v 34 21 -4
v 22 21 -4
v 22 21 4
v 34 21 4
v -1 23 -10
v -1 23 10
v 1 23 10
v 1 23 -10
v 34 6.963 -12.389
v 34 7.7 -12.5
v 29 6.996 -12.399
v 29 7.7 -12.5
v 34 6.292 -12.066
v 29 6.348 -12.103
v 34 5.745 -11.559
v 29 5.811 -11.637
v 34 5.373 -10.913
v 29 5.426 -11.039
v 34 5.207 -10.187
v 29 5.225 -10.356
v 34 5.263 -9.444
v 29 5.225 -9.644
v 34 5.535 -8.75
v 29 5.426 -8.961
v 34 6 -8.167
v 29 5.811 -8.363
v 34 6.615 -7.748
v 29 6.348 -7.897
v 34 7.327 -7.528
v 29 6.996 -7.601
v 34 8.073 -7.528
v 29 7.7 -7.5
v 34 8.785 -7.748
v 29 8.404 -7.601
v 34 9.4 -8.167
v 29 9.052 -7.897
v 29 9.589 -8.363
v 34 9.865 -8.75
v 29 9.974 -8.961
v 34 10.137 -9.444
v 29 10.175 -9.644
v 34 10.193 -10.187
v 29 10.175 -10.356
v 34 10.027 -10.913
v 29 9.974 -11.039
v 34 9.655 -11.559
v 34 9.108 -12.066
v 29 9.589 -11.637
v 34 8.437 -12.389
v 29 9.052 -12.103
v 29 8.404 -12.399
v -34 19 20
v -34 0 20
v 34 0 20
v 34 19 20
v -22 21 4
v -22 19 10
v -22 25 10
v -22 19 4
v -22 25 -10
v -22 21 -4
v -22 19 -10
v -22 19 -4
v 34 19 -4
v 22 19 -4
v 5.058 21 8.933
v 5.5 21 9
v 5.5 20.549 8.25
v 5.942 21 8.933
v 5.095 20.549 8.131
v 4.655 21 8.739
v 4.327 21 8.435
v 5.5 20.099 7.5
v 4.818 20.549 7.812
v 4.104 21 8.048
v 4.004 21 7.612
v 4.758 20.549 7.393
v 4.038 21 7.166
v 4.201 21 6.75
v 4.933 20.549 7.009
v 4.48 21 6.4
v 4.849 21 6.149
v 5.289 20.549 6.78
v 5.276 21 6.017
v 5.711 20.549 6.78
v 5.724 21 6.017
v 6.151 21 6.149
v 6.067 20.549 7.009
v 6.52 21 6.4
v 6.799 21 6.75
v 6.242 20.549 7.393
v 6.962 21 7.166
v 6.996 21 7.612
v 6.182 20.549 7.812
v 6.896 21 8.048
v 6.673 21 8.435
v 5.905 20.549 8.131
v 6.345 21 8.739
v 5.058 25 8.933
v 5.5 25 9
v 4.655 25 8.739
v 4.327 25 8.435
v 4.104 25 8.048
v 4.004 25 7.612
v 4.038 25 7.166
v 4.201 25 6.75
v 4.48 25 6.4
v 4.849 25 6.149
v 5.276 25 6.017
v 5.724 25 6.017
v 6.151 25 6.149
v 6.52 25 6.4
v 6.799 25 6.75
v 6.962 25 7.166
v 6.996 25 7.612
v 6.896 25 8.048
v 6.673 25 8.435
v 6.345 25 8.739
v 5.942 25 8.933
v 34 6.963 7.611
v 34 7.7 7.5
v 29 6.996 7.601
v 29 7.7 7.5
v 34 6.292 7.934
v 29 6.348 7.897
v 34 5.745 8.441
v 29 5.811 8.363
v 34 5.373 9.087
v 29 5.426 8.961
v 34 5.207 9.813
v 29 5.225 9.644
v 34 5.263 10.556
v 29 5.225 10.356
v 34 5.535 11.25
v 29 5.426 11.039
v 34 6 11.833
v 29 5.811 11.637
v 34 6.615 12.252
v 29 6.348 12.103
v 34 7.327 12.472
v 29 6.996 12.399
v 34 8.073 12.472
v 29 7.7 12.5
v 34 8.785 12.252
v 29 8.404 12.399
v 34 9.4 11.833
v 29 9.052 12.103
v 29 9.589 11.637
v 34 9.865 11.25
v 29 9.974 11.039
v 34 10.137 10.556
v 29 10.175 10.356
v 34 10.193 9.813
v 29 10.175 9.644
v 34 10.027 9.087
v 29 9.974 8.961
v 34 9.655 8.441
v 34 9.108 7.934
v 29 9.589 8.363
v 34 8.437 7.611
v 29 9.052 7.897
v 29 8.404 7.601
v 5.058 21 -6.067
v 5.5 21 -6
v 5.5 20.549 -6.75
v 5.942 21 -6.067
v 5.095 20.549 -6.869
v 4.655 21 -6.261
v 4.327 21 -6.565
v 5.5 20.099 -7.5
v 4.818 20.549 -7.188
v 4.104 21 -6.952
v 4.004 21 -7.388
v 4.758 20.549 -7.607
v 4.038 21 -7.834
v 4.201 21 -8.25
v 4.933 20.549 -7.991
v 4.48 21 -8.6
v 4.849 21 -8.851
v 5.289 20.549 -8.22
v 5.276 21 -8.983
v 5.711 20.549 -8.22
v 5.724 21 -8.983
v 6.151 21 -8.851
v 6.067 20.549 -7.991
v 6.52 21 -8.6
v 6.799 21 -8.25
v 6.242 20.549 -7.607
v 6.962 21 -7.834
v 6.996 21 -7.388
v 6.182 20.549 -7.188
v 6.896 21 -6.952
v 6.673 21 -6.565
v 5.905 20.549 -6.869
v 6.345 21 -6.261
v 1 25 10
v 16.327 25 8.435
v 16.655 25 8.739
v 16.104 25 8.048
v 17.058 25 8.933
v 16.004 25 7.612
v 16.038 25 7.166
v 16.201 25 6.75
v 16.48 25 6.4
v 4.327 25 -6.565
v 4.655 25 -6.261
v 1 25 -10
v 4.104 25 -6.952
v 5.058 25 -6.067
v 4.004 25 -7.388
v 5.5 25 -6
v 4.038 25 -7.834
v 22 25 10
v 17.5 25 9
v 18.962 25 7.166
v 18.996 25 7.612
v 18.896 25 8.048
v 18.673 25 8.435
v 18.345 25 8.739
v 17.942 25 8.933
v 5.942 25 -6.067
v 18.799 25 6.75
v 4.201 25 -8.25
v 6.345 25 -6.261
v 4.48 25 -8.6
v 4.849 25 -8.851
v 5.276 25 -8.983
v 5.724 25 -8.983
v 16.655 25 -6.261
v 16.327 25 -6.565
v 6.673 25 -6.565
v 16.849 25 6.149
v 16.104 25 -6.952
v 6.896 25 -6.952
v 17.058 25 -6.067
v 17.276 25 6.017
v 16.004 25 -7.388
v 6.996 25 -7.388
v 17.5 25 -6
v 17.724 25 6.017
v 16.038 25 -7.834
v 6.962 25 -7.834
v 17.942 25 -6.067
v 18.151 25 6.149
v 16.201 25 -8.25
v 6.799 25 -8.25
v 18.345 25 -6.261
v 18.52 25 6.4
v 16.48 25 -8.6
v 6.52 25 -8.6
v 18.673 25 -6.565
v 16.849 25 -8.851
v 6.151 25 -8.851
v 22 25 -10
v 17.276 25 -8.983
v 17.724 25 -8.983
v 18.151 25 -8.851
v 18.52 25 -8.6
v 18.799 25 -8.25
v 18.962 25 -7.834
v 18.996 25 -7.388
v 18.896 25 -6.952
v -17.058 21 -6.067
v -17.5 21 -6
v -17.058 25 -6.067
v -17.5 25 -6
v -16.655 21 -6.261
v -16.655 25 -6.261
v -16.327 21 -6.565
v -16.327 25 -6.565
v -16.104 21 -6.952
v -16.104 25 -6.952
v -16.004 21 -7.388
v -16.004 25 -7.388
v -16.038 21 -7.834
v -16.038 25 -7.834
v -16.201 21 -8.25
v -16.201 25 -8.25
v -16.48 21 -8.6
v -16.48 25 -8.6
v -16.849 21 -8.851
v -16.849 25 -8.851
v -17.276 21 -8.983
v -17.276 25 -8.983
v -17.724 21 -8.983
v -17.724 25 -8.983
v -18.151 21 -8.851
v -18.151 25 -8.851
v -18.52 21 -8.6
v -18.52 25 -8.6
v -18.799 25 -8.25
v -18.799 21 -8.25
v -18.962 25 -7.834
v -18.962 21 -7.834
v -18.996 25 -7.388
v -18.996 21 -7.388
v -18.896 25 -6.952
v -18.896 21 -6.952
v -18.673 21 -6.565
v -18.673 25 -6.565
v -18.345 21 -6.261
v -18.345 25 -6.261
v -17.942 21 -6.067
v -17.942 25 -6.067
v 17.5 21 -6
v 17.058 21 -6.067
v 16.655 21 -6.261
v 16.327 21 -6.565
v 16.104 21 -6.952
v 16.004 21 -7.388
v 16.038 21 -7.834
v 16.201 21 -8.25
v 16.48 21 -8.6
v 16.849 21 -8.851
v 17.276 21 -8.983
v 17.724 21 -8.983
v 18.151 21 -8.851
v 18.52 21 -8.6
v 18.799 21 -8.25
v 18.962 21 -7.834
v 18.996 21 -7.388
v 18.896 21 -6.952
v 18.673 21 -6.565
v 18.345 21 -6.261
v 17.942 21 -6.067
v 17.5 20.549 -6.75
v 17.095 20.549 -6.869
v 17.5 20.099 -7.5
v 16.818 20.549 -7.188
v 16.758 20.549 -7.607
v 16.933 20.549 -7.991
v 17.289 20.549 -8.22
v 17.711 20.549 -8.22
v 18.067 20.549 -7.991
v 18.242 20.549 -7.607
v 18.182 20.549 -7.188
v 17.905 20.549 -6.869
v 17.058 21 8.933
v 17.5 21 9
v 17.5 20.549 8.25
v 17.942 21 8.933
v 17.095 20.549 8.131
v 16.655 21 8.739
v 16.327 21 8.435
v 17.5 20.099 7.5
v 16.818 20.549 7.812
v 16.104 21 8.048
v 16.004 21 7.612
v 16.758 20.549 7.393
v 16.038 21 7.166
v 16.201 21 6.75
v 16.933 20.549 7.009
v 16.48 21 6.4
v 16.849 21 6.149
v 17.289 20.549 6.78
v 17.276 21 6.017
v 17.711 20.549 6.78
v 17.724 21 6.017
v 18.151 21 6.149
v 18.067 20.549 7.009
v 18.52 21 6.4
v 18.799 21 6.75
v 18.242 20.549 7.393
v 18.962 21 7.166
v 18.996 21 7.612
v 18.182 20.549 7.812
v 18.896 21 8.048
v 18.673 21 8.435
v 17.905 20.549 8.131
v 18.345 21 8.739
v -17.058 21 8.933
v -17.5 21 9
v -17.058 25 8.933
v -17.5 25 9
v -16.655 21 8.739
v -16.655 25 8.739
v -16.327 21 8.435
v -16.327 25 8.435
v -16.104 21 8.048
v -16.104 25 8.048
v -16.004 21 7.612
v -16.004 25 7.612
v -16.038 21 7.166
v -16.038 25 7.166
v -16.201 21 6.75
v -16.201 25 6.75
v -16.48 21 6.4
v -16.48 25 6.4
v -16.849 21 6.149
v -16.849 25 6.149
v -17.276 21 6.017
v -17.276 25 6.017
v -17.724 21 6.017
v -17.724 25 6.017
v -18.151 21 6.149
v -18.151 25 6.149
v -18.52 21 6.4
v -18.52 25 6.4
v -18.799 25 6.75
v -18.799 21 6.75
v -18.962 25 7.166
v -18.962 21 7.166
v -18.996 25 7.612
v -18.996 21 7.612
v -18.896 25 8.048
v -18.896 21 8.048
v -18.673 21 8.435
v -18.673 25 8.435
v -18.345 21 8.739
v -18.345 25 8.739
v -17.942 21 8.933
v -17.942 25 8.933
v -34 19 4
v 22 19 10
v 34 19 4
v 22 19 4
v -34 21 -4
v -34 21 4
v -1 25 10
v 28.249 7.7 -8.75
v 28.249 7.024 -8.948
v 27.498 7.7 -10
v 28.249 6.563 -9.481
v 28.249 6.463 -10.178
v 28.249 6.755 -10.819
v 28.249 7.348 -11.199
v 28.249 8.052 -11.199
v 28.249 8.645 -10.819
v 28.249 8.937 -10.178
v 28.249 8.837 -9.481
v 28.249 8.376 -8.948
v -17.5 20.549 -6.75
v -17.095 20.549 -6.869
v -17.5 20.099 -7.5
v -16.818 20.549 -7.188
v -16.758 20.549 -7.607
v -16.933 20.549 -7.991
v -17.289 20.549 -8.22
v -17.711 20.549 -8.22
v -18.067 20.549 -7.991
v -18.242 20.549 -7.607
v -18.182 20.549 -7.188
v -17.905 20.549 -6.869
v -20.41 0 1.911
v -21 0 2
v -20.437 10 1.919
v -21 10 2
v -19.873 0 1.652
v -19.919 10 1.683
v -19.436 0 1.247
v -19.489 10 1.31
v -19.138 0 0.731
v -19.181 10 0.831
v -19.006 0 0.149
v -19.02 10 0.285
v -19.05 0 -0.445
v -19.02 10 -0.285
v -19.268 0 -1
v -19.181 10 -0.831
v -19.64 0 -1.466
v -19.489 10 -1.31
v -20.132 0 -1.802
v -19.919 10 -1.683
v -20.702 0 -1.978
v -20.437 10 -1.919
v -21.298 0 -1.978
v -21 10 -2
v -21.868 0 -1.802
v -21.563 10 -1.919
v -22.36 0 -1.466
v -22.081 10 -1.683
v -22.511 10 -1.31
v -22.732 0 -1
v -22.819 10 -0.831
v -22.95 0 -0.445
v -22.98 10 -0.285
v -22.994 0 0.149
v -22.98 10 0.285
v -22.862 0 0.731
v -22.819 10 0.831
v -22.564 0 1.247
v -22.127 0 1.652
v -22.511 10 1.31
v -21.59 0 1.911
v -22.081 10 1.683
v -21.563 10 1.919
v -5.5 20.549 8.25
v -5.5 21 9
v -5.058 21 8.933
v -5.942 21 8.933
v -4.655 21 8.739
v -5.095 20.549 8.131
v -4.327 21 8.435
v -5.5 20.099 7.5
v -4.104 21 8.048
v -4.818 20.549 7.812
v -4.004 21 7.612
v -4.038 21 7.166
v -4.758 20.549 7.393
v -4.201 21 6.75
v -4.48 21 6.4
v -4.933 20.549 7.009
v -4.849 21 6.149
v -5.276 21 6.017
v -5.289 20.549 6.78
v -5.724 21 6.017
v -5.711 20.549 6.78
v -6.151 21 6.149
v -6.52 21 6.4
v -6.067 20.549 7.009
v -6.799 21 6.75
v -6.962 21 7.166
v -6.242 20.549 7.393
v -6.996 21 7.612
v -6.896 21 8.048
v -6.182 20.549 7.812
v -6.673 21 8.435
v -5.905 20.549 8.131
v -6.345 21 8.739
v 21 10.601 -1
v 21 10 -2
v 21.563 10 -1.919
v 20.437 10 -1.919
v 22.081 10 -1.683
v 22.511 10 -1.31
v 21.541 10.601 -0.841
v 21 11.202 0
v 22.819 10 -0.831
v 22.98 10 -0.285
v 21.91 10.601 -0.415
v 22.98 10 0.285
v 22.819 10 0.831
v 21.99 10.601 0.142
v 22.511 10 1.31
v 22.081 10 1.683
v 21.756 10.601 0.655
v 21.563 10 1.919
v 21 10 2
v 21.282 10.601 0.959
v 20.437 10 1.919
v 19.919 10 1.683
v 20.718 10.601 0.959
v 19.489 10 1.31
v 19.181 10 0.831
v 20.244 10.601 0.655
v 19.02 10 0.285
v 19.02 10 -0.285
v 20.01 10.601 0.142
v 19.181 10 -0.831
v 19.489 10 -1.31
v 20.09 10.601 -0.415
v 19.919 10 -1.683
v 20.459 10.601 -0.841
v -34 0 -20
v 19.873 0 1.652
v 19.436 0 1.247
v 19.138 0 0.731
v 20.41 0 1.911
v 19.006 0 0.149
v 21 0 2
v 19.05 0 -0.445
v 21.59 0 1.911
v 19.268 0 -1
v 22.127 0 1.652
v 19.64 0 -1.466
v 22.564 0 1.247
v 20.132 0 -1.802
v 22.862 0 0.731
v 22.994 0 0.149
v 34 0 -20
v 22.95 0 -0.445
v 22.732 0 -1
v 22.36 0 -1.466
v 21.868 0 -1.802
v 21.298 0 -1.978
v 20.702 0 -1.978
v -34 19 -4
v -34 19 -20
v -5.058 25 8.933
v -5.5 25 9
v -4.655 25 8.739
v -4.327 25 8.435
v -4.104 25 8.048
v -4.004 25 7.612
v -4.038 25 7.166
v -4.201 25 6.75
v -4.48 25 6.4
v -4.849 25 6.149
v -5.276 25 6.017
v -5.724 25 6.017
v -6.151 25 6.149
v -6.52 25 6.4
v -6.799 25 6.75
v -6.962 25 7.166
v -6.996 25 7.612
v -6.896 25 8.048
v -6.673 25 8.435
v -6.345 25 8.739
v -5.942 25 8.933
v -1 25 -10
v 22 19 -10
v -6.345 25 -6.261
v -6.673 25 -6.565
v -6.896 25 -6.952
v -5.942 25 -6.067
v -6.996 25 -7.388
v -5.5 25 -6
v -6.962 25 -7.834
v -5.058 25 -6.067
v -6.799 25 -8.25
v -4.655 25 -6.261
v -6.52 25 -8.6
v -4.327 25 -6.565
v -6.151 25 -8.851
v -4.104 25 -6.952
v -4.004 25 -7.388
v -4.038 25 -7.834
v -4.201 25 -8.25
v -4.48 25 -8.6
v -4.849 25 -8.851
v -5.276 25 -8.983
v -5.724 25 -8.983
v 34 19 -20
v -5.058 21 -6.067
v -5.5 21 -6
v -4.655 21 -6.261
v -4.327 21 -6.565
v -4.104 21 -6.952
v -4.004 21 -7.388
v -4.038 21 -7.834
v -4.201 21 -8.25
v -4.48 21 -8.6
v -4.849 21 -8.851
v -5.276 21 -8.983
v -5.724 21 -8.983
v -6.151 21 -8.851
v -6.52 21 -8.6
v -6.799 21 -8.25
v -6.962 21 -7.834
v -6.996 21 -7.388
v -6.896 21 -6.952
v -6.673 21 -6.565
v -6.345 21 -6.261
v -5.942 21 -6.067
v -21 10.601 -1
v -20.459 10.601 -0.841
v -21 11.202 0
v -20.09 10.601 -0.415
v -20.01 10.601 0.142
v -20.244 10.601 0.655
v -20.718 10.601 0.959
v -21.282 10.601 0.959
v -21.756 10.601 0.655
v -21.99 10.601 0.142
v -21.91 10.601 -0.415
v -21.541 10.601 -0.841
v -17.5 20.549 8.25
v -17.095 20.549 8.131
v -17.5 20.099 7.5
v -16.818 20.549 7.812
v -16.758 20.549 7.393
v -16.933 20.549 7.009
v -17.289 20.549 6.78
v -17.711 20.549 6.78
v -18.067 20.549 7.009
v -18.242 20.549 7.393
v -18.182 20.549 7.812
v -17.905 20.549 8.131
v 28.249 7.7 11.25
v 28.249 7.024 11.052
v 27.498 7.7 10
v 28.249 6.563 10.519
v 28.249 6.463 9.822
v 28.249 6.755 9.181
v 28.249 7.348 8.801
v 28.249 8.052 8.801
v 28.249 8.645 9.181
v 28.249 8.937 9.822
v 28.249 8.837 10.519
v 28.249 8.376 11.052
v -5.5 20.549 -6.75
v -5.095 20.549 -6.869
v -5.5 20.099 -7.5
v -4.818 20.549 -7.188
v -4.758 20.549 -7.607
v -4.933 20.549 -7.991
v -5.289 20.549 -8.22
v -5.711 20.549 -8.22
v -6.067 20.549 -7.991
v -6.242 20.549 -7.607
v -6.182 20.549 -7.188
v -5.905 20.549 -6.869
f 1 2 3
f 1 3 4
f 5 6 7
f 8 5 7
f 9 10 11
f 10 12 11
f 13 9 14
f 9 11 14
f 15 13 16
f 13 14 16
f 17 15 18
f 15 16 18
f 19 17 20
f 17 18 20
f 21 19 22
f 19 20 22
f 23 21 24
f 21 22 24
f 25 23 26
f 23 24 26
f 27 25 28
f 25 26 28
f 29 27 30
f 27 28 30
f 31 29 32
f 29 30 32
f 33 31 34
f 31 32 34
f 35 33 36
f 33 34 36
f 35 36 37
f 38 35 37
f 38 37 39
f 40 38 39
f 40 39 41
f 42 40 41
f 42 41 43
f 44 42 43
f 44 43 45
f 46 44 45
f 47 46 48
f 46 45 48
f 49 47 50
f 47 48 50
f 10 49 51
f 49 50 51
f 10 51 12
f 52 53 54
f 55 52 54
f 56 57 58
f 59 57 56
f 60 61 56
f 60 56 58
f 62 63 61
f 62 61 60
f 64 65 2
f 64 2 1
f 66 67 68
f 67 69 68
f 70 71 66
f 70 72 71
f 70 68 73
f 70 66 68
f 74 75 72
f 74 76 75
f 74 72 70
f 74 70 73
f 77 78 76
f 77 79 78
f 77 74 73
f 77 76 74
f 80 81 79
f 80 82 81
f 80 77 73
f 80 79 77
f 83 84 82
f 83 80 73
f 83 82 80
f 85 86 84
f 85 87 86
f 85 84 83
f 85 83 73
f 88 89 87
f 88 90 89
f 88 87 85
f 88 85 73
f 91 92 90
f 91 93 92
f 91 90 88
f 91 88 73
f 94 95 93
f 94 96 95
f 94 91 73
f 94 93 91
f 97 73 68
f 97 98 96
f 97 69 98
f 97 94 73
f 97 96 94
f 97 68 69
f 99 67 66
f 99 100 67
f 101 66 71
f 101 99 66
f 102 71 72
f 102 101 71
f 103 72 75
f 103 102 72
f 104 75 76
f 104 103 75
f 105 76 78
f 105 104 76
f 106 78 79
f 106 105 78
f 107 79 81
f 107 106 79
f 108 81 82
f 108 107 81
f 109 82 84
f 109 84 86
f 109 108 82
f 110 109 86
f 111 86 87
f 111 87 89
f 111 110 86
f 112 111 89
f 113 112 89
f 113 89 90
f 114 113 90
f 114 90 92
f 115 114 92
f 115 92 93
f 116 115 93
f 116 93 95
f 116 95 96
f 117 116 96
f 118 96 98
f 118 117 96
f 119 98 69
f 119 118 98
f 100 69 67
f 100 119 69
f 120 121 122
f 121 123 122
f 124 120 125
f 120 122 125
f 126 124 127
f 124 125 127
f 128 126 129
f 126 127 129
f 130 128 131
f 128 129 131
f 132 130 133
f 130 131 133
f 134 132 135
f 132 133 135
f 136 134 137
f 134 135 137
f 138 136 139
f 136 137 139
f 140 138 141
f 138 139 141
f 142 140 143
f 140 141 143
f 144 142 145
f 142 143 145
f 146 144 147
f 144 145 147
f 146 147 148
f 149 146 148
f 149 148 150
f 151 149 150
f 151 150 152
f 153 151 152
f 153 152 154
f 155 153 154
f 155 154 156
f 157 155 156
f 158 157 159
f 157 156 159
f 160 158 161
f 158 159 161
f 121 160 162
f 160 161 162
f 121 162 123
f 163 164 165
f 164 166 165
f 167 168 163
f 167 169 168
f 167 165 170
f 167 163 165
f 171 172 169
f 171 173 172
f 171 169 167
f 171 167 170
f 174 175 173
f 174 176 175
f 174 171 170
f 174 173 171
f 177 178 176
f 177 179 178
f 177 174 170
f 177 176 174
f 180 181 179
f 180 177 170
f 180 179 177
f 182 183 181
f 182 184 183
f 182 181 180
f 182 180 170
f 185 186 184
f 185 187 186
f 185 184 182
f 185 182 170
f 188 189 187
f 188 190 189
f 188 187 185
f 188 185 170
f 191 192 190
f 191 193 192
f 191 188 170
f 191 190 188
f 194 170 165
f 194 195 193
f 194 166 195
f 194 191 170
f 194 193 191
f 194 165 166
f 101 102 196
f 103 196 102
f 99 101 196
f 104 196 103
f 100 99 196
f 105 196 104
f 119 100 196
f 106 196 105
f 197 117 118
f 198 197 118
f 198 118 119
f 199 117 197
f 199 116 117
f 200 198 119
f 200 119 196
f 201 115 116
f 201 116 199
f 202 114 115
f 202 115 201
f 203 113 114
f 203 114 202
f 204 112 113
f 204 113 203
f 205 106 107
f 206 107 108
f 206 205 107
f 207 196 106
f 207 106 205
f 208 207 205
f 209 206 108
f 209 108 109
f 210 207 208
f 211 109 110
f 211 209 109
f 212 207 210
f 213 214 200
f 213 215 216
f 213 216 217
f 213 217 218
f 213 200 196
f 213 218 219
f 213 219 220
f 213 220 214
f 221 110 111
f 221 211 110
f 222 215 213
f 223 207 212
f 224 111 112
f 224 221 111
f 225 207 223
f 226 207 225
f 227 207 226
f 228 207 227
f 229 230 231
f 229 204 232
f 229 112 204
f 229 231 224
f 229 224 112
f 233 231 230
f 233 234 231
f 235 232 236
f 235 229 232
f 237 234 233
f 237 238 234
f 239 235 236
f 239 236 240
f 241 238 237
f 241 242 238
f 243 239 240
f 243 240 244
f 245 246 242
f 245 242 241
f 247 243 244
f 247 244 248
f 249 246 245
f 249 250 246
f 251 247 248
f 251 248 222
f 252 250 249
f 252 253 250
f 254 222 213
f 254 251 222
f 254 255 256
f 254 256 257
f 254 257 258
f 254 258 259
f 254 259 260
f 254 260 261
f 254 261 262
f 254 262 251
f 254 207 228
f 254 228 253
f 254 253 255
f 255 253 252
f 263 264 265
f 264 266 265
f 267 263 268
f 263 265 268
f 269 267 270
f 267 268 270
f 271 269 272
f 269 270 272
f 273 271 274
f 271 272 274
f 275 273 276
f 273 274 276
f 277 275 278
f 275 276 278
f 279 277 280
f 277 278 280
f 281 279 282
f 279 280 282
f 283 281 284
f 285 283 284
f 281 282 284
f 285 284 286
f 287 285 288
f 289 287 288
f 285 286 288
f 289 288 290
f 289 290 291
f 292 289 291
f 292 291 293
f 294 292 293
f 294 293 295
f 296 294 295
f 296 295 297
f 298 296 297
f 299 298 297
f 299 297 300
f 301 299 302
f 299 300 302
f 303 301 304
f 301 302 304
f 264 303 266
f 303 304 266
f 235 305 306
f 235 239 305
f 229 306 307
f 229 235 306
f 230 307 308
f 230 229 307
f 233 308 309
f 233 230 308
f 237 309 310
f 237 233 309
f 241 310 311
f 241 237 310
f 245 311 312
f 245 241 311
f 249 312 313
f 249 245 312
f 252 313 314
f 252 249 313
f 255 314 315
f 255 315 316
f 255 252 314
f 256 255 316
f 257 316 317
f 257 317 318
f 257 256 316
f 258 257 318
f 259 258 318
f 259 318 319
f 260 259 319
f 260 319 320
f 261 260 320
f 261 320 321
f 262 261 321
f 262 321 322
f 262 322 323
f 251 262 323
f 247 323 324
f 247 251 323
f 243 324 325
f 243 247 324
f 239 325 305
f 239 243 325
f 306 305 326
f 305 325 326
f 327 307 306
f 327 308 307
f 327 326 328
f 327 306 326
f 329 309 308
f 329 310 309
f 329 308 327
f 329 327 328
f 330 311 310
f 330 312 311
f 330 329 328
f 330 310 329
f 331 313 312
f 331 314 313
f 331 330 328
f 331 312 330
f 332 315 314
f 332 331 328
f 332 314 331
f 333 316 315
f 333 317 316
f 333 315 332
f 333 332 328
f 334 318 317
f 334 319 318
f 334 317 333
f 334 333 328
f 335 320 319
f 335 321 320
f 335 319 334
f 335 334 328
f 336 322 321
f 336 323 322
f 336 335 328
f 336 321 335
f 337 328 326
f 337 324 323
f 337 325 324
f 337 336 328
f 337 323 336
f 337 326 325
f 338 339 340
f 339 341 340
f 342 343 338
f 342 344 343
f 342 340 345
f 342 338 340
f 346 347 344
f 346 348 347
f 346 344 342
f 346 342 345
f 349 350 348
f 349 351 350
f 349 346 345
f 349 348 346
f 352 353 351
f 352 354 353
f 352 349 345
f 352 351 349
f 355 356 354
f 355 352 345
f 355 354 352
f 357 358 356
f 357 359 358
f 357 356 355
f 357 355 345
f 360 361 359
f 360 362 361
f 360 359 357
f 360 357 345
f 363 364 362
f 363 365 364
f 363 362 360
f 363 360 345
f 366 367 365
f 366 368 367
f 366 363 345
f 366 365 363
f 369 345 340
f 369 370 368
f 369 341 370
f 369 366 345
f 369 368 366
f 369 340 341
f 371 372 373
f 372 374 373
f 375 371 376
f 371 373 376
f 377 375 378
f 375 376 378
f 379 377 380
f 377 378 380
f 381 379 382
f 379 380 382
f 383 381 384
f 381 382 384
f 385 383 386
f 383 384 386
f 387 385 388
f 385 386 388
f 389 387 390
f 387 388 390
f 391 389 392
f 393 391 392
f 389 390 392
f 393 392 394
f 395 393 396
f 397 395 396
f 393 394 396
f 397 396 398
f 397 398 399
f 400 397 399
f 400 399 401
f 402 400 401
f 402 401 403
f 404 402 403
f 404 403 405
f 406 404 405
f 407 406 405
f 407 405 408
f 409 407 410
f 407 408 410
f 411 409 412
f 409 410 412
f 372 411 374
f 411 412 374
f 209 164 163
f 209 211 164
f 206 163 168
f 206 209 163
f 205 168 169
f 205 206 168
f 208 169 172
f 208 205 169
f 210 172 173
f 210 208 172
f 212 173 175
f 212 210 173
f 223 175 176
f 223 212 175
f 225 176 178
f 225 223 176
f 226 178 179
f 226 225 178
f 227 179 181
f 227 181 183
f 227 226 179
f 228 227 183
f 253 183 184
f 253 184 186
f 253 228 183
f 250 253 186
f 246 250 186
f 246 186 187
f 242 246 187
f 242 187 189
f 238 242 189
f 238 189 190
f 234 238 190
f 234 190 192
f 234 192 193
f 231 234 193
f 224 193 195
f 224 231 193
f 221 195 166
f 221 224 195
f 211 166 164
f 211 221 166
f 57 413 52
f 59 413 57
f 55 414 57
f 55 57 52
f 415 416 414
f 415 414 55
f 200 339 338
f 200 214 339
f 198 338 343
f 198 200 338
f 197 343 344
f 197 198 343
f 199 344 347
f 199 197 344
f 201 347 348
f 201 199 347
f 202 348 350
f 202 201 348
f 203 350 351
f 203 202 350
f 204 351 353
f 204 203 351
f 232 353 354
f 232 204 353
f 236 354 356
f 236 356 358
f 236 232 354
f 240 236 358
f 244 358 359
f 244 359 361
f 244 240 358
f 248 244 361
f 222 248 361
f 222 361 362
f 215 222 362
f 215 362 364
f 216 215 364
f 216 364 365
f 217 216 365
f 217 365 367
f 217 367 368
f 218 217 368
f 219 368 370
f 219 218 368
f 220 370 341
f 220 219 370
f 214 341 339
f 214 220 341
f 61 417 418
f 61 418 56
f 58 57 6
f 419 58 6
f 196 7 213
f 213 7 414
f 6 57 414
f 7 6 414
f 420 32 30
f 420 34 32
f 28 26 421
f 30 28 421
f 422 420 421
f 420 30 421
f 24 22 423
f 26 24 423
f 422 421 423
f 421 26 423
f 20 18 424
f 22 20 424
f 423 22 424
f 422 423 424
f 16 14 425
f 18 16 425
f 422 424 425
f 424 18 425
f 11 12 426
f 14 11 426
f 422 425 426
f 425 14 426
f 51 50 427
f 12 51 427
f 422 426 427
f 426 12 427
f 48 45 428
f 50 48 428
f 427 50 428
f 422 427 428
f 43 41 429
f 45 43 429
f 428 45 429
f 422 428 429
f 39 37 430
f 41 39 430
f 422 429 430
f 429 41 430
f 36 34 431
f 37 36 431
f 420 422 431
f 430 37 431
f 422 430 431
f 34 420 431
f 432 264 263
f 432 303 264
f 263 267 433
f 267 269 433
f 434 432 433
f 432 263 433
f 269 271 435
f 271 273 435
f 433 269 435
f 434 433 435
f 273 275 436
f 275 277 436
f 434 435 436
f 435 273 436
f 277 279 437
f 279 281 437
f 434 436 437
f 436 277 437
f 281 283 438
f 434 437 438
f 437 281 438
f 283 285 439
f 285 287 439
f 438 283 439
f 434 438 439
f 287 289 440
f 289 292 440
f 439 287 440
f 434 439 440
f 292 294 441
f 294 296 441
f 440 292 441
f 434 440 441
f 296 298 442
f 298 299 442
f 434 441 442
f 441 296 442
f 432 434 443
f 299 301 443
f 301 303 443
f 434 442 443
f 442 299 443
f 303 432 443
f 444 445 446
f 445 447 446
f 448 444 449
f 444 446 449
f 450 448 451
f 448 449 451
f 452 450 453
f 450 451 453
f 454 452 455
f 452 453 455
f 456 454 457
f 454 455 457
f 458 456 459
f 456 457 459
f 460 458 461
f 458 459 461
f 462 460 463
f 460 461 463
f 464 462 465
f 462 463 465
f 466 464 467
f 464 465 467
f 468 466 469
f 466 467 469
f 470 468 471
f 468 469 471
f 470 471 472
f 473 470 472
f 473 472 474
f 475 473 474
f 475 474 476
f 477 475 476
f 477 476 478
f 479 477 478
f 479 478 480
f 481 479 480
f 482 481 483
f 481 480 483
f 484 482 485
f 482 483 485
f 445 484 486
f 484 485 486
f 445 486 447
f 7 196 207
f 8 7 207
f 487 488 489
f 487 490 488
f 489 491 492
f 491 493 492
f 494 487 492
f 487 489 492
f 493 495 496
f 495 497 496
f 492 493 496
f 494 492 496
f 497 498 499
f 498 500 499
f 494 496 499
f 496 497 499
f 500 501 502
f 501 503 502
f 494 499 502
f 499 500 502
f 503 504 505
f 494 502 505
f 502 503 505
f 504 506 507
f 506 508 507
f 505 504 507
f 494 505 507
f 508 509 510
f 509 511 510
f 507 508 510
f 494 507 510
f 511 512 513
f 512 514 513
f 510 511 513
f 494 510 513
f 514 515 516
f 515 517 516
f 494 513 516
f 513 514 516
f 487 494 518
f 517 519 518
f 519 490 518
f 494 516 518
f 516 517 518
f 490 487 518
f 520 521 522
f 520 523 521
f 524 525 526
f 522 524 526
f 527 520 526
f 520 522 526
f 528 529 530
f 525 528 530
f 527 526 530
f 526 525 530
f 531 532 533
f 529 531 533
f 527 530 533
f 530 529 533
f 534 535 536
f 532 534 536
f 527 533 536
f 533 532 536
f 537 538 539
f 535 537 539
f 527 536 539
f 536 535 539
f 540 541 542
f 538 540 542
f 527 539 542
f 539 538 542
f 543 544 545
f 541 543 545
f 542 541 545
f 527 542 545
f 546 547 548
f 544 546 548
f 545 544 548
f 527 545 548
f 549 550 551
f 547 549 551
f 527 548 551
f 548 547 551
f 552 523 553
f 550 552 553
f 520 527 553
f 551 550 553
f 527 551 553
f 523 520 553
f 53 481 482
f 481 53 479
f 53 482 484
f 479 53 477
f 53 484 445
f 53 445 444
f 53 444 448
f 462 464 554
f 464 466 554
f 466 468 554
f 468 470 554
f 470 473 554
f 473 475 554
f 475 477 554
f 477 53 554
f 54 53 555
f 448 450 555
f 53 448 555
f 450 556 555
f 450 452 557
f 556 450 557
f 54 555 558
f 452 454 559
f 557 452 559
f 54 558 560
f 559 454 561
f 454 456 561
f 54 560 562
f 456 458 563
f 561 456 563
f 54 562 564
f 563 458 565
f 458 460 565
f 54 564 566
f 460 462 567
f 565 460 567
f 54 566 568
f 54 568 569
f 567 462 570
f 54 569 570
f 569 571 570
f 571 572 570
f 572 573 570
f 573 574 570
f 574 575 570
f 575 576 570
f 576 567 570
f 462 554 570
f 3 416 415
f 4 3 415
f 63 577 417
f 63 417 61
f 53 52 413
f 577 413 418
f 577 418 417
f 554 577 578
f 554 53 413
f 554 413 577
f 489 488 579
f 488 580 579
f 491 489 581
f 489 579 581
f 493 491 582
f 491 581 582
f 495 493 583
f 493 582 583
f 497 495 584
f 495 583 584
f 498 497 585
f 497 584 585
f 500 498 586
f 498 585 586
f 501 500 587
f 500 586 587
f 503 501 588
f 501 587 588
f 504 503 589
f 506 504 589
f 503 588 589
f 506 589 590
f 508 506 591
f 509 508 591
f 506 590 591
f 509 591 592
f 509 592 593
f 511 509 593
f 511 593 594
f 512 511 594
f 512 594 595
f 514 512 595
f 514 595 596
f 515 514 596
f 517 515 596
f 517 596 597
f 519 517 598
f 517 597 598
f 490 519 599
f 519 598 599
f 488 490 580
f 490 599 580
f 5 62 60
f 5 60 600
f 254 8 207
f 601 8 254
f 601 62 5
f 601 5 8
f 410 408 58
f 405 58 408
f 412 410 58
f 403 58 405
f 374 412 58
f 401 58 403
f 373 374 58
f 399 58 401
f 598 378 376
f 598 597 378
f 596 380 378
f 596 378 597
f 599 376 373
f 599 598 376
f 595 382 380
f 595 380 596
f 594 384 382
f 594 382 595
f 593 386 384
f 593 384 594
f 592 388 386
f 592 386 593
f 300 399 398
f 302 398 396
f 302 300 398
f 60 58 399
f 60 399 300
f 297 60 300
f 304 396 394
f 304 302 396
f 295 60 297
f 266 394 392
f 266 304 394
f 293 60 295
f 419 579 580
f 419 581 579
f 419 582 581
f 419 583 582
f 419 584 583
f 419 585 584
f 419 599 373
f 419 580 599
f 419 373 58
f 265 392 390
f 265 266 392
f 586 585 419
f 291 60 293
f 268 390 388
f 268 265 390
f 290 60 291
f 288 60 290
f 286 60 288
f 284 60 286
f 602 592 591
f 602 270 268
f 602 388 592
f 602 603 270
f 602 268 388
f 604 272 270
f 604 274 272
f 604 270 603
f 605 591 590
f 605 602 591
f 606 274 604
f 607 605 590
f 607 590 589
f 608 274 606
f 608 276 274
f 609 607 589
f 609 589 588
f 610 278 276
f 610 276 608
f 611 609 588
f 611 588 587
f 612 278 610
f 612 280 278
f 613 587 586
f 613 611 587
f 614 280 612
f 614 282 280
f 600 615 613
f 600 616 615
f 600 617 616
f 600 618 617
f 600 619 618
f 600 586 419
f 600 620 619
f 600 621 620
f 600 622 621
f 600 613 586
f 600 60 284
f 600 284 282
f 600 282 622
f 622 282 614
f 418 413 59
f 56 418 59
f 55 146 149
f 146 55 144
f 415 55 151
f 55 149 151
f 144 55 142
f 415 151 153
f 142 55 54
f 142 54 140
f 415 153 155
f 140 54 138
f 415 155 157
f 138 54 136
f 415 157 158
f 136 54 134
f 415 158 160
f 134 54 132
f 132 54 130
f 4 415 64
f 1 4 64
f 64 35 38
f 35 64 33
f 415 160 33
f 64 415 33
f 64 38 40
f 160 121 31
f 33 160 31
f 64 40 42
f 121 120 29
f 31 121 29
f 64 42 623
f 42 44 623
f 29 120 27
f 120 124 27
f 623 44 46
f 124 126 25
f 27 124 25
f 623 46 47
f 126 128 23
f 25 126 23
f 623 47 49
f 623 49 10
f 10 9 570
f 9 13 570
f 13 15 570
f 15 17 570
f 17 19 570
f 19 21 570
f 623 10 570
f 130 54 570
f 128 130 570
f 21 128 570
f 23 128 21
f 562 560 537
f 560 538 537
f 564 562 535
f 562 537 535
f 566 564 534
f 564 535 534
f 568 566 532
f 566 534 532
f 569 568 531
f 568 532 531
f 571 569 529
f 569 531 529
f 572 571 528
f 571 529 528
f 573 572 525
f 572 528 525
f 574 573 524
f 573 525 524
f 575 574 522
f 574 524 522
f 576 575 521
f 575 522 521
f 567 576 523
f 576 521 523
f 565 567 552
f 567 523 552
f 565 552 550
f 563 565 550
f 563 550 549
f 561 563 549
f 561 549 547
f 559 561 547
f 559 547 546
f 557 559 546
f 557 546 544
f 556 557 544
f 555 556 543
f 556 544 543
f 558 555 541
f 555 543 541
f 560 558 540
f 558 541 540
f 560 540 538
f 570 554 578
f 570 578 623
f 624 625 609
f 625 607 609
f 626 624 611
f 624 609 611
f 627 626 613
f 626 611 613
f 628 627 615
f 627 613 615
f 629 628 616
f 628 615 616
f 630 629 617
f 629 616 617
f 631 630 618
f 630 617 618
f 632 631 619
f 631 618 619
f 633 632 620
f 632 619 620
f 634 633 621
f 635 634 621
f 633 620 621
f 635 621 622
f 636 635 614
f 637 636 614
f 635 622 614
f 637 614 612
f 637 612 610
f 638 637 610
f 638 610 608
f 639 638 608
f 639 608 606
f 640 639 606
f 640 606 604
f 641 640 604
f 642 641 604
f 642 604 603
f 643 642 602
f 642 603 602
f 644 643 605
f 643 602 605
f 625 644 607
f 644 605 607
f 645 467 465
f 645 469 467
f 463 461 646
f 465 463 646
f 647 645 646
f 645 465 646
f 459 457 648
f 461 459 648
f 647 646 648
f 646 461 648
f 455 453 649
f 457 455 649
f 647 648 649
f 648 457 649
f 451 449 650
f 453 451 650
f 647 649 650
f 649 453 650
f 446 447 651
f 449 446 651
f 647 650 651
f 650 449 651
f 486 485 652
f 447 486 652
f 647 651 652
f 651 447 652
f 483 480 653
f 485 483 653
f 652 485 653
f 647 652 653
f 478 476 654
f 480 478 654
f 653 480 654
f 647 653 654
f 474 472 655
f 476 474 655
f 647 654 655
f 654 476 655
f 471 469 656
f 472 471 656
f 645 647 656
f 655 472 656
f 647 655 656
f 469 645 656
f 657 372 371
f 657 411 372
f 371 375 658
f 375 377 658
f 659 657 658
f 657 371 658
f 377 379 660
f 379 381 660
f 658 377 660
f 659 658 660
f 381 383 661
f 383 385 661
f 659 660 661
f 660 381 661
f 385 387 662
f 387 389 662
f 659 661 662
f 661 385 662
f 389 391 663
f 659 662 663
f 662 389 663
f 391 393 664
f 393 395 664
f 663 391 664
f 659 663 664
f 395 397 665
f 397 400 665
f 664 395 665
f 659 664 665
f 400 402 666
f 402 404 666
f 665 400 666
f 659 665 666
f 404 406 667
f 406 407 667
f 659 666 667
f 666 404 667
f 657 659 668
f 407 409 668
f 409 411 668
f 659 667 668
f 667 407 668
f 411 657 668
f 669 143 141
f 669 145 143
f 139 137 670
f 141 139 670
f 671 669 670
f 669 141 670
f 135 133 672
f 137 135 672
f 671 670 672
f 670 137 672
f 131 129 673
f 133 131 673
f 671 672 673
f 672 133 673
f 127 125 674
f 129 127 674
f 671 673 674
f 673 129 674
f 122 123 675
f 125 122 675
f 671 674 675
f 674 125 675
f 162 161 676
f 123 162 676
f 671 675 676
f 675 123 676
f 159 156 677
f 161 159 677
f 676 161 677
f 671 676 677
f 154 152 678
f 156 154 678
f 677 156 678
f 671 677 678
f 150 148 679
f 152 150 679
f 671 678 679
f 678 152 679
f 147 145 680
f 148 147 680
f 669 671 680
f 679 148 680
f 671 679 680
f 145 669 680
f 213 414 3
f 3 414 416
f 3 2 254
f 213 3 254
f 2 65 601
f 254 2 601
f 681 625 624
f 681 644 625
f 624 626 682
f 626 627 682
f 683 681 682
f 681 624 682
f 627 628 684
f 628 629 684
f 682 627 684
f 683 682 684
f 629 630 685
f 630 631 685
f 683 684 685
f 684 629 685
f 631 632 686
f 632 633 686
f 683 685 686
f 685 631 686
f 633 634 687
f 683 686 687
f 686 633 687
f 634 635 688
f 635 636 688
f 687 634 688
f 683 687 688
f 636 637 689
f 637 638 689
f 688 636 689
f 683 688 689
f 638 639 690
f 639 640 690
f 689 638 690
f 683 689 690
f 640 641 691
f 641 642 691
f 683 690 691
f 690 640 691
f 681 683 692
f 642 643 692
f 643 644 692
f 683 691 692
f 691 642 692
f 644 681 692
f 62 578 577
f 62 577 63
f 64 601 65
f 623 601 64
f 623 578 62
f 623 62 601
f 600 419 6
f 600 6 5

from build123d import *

# Parameters (mm, degrees)
SKETCH_1_W          = 68
SKETCH_1_H          = 40
EXTRUDE_1_DEPTH     = 19
SKETCH_2_W          = 44
SKETCH_2_H          = 20
EXTRUDE_2_DEPTH     = 6
SKETCH_4_W          = 2
SKETCH_4_H          = 20
CUT_EXTRUDE_1_DEPTH = 2
SKETCH_5_W          = 68
SKETCH_5_H          = 8
EXTRUDE_3_DEPTH     = 2
MM_1_AT_2_COUNT     = 2
MM_1_AT_2_PITCH     = 15
MM_1_AT_3_COUNT     = 2
MM_1_AT_3_PITCH     = 19.209372712
MM_1_AT_4_COUNT     = 2
MM_1_AT_4_PITCH     = 12
MM_2_D              = 4
MM_2_DEPTH          = 10
MM_2_TIP            = 1.201721238
MM_3_D              = 5
MM_3_DEPTH          = 5
MM_3_TIP            = 1.502151548


with BuildPart() as part:
    # 草图1 → 凸台-拉伸1 (new body)
    with BuildSketch(Plane(origin=(0, 0, 0), x_dir=(1, 0, 0), z_dir=(0, 1, 0))):
        Rectangle(SKETCH_1_W, SKETCH_1_H)
    extrude(amount=EXTRUDE_1_DEPTH)

    # 草图2 → 凸台-拉伸2 (add)
    with BuildSketch(Plane(origin=(0, 19, 0), x_dir=(1, 0, 0), z_dir=(0, 1, 0))):
        Rectangle(SKETCH_2_W, SKETCH_2_H)
    extrude(amount=EXTRUDE_2_DEPTH)

    # 草图4 → 切除-拉伸1 (cut)
    with BuildSketch(Plane(origin=(0, 25, 0), x_dir=(1, 0, 0), z_dir=(0, 1, 0))):
        Rectangle(SKETCH_4_W, SKETCH_4_H)
    extrude(amount=-CUT_EXTRUDE_1_DEPTH, mode=Mode.SUBTRACT)

    # 草图5 → 凸台-拉伸3 (add)
    with BuildSketch(Plane(origin=(0, 19, 0), x_dir=(1, 0, 0), z_dir=(0, 1, 0))):
        Rectangle(SKETCH_5_W, SKETCH_5_H)
    extrude(amount=EXTRUDE_3_DEPTH)

    # 草图7 → 大小mm 暗销孔1 (revolve, cut)
    with BuildSketch(Plane(origin=(17.5, 25, -7.5), x_dir=(0, 0, 1), z_dir=(1, 0, 0))):
        Polygon((0, 0), (0, 4.901290929), (1.5, 4), (1.5, 0), align=None)
    mm_1 = revolve(axis=Axis((17.5, 31.35, -7.5), (0, -1, 0)), mode=Mode.SUBTRACT)

    # 大小mm 暗销孔1 at 2: 大小mm 暗销孔1 ×2
    with Locations(*[(0, 0, i * MM_1_AT_2_PITCH) for i in range(1, MM_1_AT_2_COUNT)]):
        add(mm_1, mode=Mode.SUBTRACT)

    # 大小mm 暗销孔1 at 3: 大小mm 暗销孔1 ×2
    with Locations(*[Vector(-0.6246950475544242, 0, 0.7808688094430305) * (i * MM_1_AT_3_PITCH) for i in range(1, MM_1_AT_3_COUNT)]):
        add(mm_1, mode=Mode.SUBTRACT)

    # 大小mm 暗销孔1 at 4: 大小mm 暗销孔1 ×2
    with Locations(*[(-i * MM_1_AT_4_PITCH, 0, 0) for i in range(1, MM_1_AT_4_COUNT)]):
        add(mm_1, mode=Mode.SUBTRACT)

    # 镜向1: 大小mm 暗销孔1 across plane
    add(mm_1.mirror(Plane(origin=(0, 0, 0), x_dir=(0, 0, 1), z_dir=(1, 0, 0))), mode=Mode.SUBTRACT)

    # 镜向1 copy 1 sketch → 镜向1 copy 1 (revolve, cut)
    with BuildSketch(Plane(origin=(-17.5, 25, 7.5), x_dir=(0, 0, 1), z_dir=(-1, 0, 0))):
        Polygon((0, 0), (0, -4.901290929), (1.5, -4), (1.5, 0), align=None)
    revolve(axis=Axis((-17.5, 31.35, 7.5), (0, 1, 0)), mode=Mode.SUBTRACT)

    # 镜向1 copy 2 sketch → 镜向1 copy 2 (revolve, cut)
    with BuildSketch(Plane(origin=(-5.5, 25, 7.5), x_dir=(0, 0, 1), z_dir=(-1, 0, 0))):
        Polygon((0, 0), (0, -4.901290929), (1.5, -4), (1.5, 0), align=None)
    revolve(axis=Axis((-5.5, 31.35, 7.5), (0, 1, 0)), mode=Mode.SUBTRACT)

    # 镜向1 copy 3 sketch → 镜向1 copy 3 (revolve, cut)
    with BuildSketch(Plane(origin=(-5.5, 25, -7.5), x_dir=(0, 0, 1), z_dir=(-1, 0, 0))):
        Polygon((0, 0), (0, -4.901290929), (1.5, -4), (1.5, 0), align=None)
    revolve(axis=Axis((-5.5, 31.35, -7.5), (0, 1, 0)), mode=Mode.SUBTRACT)

    # 大小mm 暗销孔2
    with Locations(Plane(origin=(21, 0, 0), x_dir=(0, 0, -1), z_dir=(0, -1, 0))):
        with Locations((0, 0), (0, -42)):
            Hole(MM_2_D / 2, depth=MM_2_DEPTH)
            with Locations((0, 0, -(MM_2_DEPTH + MM_2_TIP / 2))):  # 118° drill point
                Cone(0, MM_2_D / 2, MM_2_TIP, mode=Mode.SUBTRACT)

    # 大小mm 暗销孔3
    with Locations(Plane(origin=(34, 7.7, -10), x_dir=(0, 0, 1), z_dir=(1, 0, 0))):
        with Locations((0, 0), (20, 0)):
            Hole(MM_3_D / 2, depth=MM_3_DEPTH)
            with Locations((0, 0, -(MM_3_DEPTH + MM_3_TIP / 2))):  # 118° drill point
                Cone(0, MM_3_D / 2, MM_3_TIP, mode=Mode.SUBTRACT)


solid = part.part
